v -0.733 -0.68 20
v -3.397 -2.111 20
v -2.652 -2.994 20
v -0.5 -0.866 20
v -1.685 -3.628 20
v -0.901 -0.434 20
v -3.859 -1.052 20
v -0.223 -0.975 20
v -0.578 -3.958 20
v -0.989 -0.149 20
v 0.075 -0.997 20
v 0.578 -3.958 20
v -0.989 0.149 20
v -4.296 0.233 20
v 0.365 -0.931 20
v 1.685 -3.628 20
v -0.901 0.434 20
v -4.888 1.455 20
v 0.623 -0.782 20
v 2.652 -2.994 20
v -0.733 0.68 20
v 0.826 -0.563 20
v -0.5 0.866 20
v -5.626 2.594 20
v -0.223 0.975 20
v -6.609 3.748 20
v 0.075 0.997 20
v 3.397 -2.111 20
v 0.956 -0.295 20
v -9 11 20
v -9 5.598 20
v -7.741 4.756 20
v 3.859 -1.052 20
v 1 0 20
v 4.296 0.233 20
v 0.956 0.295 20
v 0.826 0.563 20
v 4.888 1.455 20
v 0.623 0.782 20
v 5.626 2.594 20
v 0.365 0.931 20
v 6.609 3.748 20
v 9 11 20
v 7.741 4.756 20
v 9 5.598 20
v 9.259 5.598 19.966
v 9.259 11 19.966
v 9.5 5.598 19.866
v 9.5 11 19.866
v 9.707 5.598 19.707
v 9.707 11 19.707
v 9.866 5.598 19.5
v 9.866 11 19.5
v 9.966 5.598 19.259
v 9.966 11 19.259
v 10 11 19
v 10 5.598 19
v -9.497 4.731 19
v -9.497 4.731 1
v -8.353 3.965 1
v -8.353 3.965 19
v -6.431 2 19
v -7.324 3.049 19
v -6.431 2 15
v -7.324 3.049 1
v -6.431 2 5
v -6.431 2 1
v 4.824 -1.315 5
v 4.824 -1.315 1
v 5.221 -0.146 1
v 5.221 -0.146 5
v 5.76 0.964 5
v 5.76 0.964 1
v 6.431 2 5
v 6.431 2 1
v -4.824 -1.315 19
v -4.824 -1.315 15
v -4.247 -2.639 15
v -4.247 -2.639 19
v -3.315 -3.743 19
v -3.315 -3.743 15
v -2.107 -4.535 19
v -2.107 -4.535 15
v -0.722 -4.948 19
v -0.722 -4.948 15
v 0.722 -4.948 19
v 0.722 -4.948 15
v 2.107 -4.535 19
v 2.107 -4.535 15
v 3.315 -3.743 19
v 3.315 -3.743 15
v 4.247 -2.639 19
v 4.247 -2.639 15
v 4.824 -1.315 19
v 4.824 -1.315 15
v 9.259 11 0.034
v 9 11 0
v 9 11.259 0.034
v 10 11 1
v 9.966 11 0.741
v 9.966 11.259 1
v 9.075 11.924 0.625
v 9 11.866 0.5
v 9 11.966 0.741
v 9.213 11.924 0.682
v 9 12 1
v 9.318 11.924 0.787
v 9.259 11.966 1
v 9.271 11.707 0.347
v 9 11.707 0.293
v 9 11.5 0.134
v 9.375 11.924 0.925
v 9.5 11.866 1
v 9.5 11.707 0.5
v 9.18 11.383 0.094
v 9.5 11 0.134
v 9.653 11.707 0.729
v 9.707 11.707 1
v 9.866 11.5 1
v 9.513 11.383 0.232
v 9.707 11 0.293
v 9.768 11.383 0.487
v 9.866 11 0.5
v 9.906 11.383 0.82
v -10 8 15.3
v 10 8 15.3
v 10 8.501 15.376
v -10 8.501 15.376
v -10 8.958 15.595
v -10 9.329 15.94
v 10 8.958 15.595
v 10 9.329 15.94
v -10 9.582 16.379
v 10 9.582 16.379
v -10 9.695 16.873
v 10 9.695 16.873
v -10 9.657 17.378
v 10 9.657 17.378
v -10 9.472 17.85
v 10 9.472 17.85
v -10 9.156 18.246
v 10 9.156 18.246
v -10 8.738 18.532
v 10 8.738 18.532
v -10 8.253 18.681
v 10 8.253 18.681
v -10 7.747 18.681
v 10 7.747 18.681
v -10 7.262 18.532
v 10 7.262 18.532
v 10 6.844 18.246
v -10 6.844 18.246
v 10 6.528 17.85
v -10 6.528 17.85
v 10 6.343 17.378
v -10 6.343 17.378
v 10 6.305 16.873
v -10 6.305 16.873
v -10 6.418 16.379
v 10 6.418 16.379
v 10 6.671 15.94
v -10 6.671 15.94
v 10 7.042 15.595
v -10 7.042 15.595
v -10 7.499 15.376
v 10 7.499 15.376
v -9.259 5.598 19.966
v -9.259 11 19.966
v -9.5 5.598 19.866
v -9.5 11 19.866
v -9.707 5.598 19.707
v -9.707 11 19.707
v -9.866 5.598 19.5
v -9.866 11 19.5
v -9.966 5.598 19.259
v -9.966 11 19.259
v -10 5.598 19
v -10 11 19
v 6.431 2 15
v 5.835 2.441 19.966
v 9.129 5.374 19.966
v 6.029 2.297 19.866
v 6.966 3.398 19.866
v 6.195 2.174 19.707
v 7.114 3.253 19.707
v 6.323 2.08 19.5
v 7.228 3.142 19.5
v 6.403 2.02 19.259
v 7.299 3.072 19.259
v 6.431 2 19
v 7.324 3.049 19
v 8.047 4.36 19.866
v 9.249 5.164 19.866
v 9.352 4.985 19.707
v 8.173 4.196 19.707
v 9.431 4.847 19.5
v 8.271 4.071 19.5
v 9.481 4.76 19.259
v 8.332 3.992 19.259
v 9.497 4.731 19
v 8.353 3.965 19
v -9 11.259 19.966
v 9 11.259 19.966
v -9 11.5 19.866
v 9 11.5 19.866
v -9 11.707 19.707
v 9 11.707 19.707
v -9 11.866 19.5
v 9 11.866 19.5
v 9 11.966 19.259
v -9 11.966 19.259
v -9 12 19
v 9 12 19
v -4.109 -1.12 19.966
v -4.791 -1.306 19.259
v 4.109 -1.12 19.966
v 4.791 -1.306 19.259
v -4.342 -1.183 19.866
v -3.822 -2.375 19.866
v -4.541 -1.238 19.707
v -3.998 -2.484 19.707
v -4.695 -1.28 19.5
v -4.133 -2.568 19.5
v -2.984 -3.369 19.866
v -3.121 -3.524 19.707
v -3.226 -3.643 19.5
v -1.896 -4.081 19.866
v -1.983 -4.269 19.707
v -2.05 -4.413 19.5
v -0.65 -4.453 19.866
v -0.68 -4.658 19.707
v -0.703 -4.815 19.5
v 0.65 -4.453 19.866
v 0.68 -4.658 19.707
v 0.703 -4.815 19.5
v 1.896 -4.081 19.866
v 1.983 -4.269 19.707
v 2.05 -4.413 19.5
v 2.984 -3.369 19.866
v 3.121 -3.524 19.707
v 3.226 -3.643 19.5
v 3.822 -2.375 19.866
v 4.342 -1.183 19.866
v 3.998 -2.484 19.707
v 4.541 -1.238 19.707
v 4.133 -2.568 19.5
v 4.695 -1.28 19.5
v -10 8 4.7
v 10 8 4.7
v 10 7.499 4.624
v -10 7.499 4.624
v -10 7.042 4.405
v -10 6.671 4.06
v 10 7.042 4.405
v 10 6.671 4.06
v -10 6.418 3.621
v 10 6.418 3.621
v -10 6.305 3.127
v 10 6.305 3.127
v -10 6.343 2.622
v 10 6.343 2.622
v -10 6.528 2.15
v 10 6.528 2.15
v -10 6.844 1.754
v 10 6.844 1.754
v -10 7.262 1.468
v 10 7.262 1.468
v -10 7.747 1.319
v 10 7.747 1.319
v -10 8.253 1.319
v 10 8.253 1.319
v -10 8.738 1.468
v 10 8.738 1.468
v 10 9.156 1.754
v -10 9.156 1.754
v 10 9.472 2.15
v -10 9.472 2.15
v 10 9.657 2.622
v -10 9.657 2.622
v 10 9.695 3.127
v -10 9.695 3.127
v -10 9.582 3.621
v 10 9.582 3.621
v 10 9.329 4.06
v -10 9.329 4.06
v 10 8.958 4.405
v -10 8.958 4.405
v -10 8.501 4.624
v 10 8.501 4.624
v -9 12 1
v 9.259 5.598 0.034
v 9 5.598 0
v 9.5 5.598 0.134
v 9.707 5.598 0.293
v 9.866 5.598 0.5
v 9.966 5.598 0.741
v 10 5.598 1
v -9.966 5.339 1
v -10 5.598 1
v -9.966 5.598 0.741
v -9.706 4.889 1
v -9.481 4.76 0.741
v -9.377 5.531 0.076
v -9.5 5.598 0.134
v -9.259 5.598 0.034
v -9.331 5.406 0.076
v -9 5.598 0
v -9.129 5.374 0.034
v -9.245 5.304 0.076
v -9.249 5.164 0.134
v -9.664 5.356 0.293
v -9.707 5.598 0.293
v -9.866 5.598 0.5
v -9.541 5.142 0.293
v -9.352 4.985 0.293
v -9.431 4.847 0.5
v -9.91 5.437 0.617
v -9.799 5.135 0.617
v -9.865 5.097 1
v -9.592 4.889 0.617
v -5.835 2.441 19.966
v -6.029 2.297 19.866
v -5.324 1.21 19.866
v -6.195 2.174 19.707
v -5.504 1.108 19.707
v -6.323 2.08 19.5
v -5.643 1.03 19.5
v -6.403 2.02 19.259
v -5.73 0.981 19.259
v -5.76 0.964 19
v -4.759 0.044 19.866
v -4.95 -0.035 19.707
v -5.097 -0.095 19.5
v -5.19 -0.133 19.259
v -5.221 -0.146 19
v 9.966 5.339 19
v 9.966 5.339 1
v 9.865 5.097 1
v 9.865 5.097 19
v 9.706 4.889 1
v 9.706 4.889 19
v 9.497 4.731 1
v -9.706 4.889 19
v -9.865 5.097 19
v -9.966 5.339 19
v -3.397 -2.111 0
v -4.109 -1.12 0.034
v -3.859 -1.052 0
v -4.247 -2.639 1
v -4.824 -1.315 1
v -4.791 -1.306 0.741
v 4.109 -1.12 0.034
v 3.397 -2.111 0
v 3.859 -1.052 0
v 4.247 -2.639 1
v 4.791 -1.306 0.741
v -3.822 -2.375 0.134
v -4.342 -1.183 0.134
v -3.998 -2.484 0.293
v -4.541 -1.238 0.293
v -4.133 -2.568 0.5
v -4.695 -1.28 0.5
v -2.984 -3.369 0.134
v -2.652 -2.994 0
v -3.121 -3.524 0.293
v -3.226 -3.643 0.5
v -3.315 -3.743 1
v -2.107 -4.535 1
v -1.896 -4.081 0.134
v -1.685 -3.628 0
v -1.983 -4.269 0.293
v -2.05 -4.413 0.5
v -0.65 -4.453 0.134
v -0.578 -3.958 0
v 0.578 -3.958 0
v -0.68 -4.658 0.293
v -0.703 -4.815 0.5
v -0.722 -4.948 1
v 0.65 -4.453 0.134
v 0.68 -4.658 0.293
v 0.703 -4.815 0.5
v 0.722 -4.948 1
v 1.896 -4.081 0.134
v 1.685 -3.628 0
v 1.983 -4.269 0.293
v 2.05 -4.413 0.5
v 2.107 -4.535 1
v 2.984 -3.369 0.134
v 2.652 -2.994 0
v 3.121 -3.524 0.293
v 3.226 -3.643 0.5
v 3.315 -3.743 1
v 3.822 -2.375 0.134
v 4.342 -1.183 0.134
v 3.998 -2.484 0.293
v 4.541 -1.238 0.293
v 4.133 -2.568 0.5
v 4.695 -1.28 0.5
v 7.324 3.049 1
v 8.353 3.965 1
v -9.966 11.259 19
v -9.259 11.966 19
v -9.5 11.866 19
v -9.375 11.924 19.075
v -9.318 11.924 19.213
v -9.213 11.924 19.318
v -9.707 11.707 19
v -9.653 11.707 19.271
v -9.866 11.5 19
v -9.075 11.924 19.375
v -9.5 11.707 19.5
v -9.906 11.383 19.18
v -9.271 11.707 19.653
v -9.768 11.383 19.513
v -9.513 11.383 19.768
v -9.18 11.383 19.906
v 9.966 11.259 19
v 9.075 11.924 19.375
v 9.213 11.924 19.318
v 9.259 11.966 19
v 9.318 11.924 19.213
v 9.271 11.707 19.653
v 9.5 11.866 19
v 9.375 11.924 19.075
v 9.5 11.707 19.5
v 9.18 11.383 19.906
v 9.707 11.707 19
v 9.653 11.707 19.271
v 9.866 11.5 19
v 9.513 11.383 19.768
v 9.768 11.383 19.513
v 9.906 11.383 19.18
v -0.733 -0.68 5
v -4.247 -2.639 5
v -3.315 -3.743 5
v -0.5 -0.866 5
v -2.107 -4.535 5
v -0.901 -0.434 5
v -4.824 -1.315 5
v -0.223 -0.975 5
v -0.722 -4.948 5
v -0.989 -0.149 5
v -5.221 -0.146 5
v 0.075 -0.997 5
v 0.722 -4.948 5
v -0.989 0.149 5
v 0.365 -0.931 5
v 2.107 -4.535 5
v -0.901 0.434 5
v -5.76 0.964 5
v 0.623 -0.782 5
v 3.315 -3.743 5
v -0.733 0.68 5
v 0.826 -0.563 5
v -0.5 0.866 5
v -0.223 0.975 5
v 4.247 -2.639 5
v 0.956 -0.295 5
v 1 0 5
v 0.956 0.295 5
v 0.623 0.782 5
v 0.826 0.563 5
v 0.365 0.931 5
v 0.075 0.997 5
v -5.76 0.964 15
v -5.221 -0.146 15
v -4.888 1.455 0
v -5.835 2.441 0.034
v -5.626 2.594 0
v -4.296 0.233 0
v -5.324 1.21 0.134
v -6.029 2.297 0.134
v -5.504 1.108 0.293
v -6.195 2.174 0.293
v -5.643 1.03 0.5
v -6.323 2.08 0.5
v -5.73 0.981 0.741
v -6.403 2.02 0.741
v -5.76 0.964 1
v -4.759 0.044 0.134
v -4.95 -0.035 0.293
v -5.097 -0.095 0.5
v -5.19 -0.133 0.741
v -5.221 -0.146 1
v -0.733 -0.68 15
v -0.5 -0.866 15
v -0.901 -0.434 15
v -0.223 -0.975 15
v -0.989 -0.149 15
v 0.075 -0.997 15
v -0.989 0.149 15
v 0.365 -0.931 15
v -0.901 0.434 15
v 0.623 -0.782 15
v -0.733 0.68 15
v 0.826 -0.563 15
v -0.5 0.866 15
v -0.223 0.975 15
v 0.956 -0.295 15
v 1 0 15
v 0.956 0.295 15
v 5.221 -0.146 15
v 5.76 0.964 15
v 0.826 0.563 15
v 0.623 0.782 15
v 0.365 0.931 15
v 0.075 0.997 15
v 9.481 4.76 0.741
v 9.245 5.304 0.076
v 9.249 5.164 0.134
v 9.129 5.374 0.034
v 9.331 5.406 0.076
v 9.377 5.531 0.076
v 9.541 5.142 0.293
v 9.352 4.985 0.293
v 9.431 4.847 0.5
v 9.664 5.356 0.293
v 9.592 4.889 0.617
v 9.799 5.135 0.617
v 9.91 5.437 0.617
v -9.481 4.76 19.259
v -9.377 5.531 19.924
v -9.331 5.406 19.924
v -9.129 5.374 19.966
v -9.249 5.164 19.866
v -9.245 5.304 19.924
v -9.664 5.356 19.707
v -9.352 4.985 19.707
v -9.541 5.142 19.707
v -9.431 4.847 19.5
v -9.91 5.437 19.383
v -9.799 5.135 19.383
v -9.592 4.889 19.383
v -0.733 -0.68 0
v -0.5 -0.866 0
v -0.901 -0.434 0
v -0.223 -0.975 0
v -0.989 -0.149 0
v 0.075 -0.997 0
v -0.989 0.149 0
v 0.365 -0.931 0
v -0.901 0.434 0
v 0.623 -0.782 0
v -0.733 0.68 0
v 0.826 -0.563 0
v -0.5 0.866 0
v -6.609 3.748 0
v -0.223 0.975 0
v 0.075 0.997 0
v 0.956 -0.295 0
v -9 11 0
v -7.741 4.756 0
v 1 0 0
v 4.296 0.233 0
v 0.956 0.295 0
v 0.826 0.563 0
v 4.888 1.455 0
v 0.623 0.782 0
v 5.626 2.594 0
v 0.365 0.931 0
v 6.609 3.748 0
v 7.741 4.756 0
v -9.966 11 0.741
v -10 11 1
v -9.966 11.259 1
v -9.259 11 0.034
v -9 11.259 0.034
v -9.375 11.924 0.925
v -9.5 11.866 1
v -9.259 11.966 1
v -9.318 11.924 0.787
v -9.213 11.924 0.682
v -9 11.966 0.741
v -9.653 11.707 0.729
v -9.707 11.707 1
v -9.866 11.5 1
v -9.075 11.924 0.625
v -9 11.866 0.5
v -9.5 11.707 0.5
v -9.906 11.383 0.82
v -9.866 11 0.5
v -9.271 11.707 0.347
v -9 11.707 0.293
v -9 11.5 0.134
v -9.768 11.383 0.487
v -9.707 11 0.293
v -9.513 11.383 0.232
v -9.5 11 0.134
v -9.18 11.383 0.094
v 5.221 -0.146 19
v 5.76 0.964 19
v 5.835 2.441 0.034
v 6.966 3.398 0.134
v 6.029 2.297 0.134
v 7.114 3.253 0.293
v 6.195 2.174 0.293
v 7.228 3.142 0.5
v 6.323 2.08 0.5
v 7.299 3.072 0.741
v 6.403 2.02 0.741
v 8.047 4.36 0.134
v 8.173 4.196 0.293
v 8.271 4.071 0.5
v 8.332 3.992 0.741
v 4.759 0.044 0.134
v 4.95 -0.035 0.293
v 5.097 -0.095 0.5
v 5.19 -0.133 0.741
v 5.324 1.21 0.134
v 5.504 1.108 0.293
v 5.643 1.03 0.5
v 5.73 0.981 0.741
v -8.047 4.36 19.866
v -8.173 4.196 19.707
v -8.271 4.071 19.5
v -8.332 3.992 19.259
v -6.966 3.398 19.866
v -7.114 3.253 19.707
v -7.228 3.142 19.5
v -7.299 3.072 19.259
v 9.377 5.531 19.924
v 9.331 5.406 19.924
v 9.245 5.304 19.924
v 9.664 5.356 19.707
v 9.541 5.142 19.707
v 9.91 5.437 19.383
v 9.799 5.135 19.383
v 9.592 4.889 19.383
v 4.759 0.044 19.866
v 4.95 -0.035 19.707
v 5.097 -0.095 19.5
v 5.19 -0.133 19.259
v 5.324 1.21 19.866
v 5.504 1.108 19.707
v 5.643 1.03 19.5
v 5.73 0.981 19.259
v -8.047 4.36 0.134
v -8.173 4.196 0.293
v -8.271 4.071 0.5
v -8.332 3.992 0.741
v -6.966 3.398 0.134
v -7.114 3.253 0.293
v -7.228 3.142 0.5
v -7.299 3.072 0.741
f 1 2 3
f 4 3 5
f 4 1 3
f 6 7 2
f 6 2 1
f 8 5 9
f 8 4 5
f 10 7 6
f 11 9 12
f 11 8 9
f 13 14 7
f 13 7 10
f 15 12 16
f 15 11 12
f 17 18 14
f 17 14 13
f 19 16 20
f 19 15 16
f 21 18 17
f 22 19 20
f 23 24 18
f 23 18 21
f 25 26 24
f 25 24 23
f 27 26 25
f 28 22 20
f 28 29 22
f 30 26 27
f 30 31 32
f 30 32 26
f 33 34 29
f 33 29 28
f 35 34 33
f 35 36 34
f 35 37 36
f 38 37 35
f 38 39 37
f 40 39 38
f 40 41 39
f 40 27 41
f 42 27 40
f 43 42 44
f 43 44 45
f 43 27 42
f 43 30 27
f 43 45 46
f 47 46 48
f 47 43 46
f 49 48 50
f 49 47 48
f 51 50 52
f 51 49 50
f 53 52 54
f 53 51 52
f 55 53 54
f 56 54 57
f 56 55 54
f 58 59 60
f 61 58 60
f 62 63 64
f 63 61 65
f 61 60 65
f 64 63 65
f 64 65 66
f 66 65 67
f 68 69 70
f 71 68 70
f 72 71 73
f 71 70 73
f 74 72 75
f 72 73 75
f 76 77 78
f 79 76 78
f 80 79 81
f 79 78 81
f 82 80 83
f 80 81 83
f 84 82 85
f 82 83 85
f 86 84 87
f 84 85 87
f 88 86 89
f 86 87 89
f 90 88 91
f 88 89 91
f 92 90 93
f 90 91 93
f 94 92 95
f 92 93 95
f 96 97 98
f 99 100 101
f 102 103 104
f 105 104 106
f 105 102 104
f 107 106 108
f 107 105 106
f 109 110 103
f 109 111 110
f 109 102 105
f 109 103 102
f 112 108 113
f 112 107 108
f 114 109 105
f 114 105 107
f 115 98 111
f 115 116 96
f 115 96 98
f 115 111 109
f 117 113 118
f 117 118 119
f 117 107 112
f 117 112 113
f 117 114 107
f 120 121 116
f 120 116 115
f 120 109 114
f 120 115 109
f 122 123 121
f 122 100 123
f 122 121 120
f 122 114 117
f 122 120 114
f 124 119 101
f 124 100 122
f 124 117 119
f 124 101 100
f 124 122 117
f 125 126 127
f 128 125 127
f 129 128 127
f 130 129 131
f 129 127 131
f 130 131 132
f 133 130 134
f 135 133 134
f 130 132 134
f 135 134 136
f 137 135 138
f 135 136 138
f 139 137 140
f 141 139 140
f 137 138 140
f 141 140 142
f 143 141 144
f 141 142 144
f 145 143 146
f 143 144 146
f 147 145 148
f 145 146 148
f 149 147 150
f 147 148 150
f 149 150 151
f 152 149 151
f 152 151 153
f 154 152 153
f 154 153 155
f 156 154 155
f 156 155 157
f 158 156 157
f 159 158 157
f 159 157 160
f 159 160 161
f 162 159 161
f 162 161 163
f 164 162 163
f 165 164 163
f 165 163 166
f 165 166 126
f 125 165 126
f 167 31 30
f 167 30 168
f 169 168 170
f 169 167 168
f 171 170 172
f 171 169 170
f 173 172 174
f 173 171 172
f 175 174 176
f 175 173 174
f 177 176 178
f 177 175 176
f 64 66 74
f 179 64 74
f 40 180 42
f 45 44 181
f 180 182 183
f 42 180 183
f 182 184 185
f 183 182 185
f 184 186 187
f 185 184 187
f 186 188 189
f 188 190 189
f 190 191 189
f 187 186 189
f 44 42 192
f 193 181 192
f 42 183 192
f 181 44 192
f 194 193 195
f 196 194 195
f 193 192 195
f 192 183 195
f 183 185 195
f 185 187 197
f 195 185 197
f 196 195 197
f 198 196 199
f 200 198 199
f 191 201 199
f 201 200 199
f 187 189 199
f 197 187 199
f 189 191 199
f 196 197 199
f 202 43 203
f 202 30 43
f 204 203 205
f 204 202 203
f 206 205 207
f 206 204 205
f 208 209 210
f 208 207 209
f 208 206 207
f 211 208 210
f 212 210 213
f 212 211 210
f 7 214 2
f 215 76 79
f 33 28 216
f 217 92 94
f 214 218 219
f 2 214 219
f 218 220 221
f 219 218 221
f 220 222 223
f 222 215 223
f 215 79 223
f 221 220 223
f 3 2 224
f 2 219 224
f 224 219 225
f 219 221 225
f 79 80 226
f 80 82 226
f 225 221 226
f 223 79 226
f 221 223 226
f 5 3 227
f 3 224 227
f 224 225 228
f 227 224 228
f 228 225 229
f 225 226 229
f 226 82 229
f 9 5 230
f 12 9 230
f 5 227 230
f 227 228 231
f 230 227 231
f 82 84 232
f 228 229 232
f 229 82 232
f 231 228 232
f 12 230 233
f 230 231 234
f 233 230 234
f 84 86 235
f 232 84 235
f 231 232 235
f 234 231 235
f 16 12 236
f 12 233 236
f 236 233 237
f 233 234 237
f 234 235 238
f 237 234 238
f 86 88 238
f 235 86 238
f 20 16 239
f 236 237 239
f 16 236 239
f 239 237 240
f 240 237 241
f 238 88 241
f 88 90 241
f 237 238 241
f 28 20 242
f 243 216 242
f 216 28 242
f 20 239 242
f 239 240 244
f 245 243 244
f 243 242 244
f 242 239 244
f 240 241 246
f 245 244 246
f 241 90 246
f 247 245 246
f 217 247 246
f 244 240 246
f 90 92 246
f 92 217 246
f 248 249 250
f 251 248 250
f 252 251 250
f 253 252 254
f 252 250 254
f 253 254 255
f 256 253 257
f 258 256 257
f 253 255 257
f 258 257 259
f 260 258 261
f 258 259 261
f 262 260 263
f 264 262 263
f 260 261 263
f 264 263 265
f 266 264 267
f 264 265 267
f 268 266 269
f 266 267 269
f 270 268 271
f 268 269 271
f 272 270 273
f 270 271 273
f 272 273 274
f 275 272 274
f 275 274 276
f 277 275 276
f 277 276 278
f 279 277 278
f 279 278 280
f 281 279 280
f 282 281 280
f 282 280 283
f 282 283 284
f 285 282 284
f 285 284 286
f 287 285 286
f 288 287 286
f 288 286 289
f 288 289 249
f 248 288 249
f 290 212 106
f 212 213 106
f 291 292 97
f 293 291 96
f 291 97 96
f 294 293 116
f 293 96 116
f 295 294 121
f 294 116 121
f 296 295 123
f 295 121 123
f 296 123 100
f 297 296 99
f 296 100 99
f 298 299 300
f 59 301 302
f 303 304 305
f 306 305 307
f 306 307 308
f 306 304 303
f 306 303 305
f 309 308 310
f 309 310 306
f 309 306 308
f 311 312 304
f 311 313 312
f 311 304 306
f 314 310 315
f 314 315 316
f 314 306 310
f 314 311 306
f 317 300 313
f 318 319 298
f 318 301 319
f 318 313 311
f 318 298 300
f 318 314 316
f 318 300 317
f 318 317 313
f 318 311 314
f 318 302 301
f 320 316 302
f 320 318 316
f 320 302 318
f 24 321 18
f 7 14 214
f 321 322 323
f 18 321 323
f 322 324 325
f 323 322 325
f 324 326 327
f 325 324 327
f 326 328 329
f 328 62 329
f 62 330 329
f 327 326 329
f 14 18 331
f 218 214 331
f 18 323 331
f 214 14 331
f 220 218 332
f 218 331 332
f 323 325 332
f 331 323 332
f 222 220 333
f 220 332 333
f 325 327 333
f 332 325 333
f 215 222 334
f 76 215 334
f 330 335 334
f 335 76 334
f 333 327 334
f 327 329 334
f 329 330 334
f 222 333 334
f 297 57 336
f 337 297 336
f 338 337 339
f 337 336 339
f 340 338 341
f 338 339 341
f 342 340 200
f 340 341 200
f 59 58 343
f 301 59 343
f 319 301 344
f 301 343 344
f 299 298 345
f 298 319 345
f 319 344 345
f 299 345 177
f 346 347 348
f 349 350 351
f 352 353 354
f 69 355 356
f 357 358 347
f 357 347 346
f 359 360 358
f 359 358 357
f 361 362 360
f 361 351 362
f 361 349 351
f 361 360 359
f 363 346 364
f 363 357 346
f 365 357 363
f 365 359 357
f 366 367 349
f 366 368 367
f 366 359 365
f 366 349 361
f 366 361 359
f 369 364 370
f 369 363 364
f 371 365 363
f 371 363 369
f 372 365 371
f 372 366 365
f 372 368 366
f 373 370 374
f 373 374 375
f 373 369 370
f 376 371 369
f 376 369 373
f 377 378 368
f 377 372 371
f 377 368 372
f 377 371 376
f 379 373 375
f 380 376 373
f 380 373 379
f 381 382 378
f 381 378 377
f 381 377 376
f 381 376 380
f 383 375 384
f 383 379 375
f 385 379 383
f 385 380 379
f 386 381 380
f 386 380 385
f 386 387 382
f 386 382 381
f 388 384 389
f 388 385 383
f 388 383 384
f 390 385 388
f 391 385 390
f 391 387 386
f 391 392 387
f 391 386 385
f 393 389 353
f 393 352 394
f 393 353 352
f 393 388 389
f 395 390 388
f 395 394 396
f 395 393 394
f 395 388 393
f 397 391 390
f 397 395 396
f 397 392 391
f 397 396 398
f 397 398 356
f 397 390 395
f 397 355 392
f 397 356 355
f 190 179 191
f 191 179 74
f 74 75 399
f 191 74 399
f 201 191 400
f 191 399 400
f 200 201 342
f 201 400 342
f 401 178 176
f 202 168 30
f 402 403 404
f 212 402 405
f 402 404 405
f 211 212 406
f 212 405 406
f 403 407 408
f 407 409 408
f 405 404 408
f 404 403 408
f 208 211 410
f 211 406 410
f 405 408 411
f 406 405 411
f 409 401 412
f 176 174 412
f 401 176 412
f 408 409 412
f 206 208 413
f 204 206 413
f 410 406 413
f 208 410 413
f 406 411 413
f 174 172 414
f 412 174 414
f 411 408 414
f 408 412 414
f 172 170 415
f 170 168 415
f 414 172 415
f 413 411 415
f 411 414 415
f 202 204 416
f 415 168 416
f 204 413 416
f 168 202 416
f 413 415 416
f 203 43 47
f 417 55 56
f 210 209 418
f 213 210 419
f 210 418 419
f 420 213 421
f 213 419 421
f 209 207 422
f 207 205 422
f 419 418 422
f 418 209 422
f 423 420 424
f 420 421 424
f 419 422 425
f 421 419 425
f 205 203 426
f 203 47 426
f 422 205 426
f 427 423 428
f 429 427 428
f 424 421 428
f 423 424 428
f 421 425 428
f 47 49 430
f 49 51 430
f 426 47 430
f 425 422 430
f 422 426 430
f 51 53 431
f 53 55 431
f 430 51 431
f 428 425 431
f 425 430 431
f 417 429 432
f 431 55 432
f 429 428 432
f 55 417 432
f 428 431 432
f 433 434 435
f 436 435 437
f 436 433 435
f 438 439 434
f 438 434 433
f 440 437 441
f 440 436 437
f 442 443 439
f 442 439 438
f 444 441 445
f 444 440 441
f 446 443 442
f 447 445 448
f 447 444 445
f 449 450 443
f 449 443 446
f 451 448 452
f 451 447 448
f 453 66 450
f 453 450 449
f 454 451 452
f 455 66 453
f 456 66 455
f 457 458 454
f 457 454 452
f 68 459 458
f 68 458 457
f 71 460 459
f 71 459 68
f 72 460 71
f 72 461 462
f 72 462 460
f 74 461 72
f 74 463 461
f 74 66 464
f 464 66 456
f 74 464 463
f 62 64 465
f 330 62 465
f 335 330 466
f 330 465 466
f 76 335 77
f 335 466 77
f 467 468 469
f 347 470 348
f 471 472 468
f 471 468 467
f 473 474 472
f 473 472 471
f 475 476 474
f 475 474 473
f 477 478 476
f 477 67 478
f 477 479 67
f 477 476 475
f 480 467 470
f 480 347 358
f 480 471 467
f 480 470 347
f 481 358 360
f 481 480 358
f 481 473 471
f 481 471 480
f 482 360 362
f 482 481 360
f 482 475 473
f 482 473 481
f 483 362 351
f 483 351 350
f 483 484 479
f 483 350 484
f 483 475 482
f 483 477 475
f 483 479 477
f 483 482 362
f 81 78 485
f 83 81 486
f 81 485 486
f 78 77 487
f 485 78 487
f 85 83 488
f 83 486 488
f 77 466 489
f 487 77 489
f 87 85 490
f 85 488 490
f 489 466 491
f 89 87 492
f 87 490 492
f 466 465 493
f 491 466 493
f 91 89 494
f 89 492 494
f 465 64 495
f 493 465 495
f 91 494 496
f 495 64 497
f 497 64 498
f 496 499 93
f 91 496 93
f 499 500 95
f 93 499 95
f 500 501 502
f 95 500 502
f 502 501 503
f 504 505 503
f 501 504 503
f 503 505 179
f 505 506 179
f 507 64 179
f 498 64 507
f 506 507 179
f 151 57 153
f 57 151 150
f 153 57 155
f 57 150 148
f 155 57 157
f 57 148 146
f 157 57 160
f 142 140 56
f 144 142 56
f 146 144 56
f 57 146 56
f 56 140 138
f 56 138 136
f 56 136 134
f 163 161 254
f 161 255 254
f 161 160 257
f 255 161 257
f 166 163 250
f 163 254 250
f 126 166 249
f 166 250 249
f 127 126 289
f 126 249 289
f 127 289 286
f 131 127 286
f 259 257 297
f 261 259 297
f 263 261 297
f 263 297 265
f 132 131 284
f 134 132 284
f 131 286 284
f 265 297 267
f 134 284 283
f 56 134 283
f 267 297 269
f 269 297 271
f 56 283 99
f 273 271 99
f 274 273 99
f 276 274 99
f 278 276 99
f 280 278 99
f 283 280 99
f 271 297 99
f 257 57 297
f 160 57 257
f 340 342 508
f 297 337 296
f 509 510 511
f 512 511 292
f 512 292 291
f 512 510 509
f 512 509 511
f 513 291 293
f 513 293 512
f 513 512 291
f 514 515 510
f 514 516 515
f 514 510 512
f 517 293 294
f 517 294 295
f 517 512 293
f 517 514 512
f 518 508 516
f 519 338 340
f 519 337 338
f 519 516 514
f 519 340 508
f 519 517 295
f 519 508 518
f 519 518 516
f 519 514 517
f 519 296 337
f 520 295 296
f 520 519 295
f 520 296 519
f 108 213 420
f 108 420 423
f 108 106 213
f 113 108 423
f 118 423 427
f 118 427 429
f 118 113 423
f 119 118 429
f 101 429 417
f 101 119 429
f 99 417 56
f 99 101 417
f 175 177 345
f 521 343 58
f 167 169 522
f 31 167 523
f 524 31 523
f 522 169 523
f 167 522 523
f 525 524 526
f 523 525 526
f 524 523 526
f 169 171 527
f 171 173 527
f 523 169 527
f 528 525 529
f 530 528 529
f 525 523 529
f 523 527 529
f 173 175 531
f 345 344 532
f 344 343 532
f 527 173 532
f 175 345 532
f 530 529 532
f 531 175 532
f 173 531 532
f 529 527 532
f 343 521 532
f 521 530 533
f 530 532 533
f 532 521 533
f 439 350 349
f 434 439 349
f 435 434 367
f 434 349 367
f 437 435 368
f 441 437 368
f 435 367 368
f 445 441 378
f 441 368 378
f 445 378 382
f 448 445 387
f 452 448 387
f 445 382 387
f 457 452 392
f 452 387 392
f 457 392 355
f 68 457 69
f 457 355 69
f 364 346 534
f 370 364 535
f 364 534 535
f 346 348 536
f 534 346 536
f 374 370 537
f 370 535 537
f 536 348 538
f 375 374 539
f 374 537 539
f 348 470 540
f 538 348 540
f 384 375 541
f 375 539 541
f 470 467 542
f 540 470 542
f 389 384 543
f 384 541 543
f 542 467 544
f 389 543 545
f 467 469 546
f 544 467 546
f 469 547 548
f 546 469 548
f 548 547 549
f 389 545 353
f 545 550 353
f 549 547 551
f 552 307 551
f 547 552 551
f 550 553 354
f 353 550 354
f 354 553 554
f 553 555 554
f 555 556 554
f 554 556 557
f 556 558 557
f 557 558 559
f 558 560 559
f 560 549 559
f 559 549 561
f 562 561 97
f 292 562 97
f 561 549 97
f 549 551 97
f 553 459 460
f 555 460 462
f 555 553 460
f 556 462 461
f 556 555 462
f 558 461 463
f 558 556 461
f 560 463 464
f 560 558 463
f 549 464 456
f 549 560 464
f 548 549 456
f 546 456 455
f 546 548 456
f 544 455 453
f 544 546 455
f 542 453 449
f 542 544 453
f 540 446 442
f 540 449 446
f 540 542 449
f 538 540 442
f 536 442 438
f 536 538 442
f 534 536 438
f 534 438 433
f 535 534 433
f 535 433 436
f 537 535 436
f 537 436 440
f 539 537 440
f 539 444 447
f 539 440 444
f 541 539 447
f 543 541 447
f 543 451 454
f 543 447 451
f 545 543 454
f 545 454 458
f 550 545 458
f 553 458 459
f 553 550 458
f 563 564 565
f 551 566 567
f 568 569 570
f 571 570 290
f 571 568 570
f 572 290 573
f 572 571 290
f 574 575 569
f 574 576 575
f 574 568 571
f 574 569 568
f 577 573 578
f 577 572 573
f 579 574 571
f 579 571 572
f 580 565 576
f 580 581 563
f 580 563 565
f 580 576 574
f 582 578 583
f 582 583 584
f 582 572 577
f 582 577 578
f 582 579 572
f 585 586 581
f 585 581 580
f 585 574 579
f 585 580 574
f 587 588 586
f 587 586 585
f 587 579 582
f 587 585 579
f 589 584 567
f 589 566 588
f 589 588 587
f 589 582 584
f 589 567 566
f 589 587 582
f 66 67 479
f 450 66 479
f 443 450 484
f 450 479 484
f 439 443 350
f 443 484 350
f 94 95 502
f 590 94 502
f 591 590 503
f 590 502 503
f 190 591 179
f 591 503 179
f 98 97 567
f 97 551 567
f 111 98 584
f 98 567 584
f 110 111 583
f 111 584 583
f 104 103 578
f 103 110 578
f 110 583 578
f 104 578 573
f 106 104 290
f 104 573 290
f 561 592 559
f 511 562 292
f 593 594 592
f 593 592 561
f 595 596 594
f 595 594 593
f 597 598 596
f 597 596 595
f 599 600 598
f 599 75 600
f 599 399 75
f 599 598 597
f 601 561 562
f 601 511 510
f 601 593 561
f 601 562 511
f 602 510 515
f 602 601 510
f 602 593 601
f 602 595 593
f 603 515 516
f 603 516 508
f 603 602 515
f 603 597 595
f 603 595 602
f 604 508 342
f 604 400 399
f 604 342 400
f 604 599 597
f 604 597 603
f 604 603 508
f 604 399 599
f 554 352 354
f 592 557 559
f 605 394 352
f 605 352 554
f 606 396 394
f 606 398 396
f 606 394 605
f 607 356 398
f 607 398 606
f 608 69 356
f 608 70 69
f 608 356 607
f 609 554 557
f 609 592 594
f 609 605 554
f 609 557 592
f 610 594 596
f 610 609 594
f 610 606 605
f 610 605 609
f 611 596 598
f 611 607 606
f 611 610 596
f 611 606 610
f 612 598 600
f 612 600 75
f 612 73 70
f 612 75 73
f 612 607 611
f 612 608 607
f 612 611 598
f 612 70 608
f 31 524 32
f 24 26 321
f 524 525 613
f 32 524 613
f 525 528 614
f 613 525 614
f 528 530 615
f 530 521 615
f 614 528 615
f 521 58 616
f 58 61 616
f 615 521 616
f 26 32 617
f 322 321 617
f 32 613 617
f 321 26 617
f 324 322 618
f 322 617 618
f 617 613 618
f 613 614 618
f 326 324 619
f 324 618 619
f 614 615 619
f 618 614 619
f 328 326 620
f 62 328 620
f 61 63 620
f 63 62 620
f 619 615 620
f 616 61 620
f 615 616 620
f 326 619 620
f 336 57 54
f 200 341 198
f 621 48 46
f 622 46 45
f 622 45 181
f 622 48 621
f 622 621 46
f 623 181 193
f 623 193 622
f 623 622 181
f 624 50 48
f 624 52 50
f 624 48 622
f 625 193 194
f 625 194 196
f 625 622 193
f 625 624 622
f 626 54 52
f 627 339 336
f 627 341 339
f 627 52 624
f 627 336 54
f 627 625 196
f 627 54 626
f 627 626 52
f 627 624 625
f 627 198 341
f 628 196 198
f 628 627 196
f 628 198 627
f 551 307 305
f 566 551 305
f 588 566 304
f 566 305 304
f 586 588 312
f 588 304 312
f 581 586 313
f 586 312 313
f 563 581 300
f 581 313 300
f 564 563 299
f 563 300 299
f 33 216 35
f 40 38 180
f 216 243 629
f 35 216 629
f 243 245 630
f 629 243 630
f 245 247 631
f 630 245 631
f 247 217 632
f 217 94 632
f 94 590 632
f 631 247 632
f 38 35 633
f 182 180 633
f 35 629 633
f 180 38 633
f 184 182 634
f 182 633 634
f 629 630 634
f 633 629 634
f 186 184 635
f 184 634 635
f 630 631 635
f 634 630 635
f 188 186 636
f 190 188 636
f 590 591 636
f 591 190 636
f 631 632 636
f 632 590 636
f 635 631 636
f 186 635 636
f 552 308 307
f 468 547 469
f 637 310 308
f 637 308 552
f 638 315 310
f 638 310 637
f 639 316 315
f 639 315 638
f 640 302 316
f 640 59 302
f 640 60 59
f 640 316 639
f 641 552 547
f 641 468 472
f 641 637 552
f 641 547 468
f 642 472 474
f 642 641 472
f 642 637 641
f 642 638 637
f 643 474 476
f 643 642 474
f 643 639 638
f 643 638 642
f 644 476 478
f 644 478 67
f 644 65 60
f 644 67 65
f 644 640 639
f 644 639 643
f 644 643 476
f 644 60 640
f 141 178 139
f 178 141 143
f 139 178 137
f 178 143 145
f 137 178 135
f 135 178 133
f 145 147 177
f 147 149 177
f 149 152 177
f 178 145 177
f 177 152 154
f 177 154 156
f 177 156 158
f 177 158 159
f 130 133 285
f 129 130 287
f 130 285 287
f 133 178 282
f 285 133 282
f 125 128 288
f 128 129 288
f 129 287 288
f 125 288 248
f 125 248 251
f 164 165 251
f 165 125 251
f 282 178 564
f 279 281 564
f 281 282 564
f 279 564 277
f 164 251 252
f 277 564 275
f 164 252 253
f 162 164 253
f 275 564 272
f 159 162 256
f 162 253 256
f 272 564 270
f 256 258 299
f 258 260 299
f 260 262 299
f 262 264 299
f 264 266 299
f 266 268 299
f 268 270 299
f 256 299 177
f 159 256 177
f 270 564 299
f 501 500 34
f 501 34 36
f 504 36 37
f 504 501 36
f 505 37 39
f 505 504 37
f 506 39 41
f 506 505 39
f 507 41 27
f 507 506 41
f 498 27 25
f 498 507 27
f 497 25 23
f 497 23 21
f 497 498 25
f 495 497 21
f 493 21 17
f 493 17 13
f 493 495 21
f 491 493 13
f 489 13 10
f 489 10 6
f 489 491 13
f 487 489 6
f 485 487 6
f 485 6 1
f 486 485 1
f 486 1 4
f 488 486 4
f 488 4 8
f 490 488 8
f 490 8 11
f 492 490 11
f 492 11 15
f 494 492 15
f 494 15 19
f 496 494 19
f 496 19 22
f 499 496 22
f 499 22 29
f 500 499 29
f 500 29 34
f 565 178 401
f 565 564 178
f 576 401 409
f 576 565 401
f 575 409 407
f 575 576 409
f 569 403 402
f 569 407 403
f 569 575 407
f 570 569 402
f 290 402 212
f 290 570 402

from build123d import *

# Parameters (mm, degrees)
SKETCH1_R           = 1
BOSS_EXTRUDE1_DEPTH = 20
SKETCH2_R           = 1.7
CUT_EXTRUDE1_DEPTH  = 33.496153619
SKETCH3_W           = 20
SKETCH3_H           = 4
CUT_EXTRUDE2_DEPTH  = 33.496153619
CUT_EXTRUDE3_DEPTH  = 28.730849248
FILLET1_DEPTH       = 20
FILLET1_2_DEPTH     = 5
FILLET1_START       = 15
FILLET1_3_DEPTH     = 5
FILLET2_R           = 1


with BuildPart() as part:
    # Sketch1 → Boss-Extrude1 (new body)
    with BuildSketch(Plane.XY):
        with BuildLine():
            Line((5, 0), (5, 5))
            Line((5, 5), (10, 5))
            Line((10, 5), (10, 16))
            Line((10, 16), (-10, 16))
            Line((-10, 16), (-10, 5))
            Line((-10, 5), (-5, 5))
            Line((-5, 5), (-5, 0))
            ThreePointArc((-5, 0), (0, -5), (5, 0))
        make_face()
        Circle(SKETCH1_R, mode=Mode.SUBTRACT)
    extrude(amount=BOSS_EXTRUDE1_DEPTH)

    # Sketch2 → Cut-Extrude1 (cut, through all)
    with BuildSketch(Plane(origin=(10, 0, 0), x_dir=(0, 0, -1), z_dir=(1, 0, 0))):
        with Locations((-17, 8)):
            Circle(SKETCH2_R)
        with Locations(Location((-3, 8, 0), (0, 0, 180))):
            Circle(SKETCH2_R)
    extrude(amount=-CUT_EXTRUDE1_DEPTH, mode=Mode.SUBTRACT)

    # Sketch3 → Cut-Extrude2 (cut, through all)
    with BuildSketch(Plane(origin=(10, 0, 0), x_dir=(0, 0, -1), z_dir=(1, 0, 0))):
        with Locations((-10, 14)):
            Rectangle(SKETCH3_W, SKETCH3_H)
    extrude(amount=-CUT_EXTRUDE2_DEPTH, mode=Mode.SUBTRACT)

    # Sketch4 → Cut-Extrude3 (cut, through all)
    with BuildSketch(Plane(origin=(5, 0, 0), x_dir=(0, 0, -1), z_dir=(1, 0, 0))):
        Polygon((-10, -5), (-15, -5), (-15, 2), (-5, 2), (-5, -5), align=None)
    extrude(amount=-CUT_EXTRUDE3_DEPTH, mode=Mode.SUBTRACT)

    # Fillet1: read off the stored shape, not the designer's step
    # Fillet1 outline → Fillet1 (add)
    with BuildSketch(Plane.XY):
        with BuildLine():
            Line((5, 2), (6.4306416, 2))
            ThreePointArc((6.4306416, 2), (8.038028722, 3.710939656), (10, 5))
            Line((10, 5), (5, 5))
            Line((5, 5), (5, 2))
        make_face()
        with BuildLine():
            Line((-6.4306416, 2), (-5, 2))
            Line((-5, 2), (-5, 5))
            Line((-5, 5), (-10, 5))
            ThreePointArc((-10, 5), (-8.038028722, 3.710939656), (-6.4306416, 2))
        make_face()
    extrude(amount=FILLET1_DEPTH)

    # Fillet1 2 outline → Fillet1 2 (add)
    with BuildSketch(Plane.XY):
        with BuildLine():
            ThreePointArc((4.824045318, -1.314757303), (5.473399472, 0.417234907), (6.4306416, 2))
            Line((6.4306416, 2), (5, 2))
            Line((5, 2), (5, 0))
            ThreePointArc((5, 0), (4.955816204, -0.663238839), (4.824045318, -1.314757303))
        make_face()
        with BuildLine():
            Line((-5, 0), (-5, 2))
            Line((-5, 2), (-6.4306416, 2))
            ThreePointArc((-6.4306416, 2), (-5.473399472, 0.417234907), (-4.824045318, -1.314757303))
            ThreePointArc((-4.824045318, -1.314757303), (-4.955816204, -0.663238839), (-5, 0))
        make_face()
    extrude(amount=FILLET1_2_DEPTH)

    # Fillet1 3 outline → Fillet1 3 (add)
    with BuildSketch(Plane.XY.offset(FILLET1_START)):
        with BuildLine():
            ThreePointArc((4.824045318, -1.314757303), (5.473399472, 0.417234907), (6.4306416, 2))
            Line((6.4306416, 2), (5, 2))
            Line((5, 2), (5, 0))
            ThreePointArc((5, 0), (4.955816204, -0.663238839), (4.824045318, -1.314757303))
        make_face()
        with BuildLine():
            Line((-5, 0), (-5, 2))
            Line((-5, 2), (-6.4306416, 2))
            ThreePointArc((-6.4306416, 2), (-5.473399472, 0.417234907), (-4.824045318, -1.314757303))
            ThreePointArc((-4.824045318, -1.314757303), (-4.955816204, -0.663238839), (-5, 0))
        make_face()
    extrude(amount=FILLET1_3_DEPTH)

    # Fillet2
    fillet2_edges = [part.edges().sort_by_distance(p)[0] for p in [
        (10, 8.5, 0),
        (-10, 5, 10),
        (10, 5, 10),
        (10, 8.5, 20),
        (-10, 8.5, 0),
        (-10, 8.5, 20),
        (-10, 12, 10),
        (0, 12, 0),
        (0, 12, 20),
        (10, 12, 10),
        (0, -5, 0),
        (0, -5, 20),
        (8.038028722, 3.710939656, 0),
        (8.038028722, 3.710939656, 20),
        (-8.038028722, 3.710939656, 0),
        (-8.038028722, 3.710939656, 20),
    ]]
    fillet(fillet2_edges, radius=FILLET2_R)


solid = part.part
